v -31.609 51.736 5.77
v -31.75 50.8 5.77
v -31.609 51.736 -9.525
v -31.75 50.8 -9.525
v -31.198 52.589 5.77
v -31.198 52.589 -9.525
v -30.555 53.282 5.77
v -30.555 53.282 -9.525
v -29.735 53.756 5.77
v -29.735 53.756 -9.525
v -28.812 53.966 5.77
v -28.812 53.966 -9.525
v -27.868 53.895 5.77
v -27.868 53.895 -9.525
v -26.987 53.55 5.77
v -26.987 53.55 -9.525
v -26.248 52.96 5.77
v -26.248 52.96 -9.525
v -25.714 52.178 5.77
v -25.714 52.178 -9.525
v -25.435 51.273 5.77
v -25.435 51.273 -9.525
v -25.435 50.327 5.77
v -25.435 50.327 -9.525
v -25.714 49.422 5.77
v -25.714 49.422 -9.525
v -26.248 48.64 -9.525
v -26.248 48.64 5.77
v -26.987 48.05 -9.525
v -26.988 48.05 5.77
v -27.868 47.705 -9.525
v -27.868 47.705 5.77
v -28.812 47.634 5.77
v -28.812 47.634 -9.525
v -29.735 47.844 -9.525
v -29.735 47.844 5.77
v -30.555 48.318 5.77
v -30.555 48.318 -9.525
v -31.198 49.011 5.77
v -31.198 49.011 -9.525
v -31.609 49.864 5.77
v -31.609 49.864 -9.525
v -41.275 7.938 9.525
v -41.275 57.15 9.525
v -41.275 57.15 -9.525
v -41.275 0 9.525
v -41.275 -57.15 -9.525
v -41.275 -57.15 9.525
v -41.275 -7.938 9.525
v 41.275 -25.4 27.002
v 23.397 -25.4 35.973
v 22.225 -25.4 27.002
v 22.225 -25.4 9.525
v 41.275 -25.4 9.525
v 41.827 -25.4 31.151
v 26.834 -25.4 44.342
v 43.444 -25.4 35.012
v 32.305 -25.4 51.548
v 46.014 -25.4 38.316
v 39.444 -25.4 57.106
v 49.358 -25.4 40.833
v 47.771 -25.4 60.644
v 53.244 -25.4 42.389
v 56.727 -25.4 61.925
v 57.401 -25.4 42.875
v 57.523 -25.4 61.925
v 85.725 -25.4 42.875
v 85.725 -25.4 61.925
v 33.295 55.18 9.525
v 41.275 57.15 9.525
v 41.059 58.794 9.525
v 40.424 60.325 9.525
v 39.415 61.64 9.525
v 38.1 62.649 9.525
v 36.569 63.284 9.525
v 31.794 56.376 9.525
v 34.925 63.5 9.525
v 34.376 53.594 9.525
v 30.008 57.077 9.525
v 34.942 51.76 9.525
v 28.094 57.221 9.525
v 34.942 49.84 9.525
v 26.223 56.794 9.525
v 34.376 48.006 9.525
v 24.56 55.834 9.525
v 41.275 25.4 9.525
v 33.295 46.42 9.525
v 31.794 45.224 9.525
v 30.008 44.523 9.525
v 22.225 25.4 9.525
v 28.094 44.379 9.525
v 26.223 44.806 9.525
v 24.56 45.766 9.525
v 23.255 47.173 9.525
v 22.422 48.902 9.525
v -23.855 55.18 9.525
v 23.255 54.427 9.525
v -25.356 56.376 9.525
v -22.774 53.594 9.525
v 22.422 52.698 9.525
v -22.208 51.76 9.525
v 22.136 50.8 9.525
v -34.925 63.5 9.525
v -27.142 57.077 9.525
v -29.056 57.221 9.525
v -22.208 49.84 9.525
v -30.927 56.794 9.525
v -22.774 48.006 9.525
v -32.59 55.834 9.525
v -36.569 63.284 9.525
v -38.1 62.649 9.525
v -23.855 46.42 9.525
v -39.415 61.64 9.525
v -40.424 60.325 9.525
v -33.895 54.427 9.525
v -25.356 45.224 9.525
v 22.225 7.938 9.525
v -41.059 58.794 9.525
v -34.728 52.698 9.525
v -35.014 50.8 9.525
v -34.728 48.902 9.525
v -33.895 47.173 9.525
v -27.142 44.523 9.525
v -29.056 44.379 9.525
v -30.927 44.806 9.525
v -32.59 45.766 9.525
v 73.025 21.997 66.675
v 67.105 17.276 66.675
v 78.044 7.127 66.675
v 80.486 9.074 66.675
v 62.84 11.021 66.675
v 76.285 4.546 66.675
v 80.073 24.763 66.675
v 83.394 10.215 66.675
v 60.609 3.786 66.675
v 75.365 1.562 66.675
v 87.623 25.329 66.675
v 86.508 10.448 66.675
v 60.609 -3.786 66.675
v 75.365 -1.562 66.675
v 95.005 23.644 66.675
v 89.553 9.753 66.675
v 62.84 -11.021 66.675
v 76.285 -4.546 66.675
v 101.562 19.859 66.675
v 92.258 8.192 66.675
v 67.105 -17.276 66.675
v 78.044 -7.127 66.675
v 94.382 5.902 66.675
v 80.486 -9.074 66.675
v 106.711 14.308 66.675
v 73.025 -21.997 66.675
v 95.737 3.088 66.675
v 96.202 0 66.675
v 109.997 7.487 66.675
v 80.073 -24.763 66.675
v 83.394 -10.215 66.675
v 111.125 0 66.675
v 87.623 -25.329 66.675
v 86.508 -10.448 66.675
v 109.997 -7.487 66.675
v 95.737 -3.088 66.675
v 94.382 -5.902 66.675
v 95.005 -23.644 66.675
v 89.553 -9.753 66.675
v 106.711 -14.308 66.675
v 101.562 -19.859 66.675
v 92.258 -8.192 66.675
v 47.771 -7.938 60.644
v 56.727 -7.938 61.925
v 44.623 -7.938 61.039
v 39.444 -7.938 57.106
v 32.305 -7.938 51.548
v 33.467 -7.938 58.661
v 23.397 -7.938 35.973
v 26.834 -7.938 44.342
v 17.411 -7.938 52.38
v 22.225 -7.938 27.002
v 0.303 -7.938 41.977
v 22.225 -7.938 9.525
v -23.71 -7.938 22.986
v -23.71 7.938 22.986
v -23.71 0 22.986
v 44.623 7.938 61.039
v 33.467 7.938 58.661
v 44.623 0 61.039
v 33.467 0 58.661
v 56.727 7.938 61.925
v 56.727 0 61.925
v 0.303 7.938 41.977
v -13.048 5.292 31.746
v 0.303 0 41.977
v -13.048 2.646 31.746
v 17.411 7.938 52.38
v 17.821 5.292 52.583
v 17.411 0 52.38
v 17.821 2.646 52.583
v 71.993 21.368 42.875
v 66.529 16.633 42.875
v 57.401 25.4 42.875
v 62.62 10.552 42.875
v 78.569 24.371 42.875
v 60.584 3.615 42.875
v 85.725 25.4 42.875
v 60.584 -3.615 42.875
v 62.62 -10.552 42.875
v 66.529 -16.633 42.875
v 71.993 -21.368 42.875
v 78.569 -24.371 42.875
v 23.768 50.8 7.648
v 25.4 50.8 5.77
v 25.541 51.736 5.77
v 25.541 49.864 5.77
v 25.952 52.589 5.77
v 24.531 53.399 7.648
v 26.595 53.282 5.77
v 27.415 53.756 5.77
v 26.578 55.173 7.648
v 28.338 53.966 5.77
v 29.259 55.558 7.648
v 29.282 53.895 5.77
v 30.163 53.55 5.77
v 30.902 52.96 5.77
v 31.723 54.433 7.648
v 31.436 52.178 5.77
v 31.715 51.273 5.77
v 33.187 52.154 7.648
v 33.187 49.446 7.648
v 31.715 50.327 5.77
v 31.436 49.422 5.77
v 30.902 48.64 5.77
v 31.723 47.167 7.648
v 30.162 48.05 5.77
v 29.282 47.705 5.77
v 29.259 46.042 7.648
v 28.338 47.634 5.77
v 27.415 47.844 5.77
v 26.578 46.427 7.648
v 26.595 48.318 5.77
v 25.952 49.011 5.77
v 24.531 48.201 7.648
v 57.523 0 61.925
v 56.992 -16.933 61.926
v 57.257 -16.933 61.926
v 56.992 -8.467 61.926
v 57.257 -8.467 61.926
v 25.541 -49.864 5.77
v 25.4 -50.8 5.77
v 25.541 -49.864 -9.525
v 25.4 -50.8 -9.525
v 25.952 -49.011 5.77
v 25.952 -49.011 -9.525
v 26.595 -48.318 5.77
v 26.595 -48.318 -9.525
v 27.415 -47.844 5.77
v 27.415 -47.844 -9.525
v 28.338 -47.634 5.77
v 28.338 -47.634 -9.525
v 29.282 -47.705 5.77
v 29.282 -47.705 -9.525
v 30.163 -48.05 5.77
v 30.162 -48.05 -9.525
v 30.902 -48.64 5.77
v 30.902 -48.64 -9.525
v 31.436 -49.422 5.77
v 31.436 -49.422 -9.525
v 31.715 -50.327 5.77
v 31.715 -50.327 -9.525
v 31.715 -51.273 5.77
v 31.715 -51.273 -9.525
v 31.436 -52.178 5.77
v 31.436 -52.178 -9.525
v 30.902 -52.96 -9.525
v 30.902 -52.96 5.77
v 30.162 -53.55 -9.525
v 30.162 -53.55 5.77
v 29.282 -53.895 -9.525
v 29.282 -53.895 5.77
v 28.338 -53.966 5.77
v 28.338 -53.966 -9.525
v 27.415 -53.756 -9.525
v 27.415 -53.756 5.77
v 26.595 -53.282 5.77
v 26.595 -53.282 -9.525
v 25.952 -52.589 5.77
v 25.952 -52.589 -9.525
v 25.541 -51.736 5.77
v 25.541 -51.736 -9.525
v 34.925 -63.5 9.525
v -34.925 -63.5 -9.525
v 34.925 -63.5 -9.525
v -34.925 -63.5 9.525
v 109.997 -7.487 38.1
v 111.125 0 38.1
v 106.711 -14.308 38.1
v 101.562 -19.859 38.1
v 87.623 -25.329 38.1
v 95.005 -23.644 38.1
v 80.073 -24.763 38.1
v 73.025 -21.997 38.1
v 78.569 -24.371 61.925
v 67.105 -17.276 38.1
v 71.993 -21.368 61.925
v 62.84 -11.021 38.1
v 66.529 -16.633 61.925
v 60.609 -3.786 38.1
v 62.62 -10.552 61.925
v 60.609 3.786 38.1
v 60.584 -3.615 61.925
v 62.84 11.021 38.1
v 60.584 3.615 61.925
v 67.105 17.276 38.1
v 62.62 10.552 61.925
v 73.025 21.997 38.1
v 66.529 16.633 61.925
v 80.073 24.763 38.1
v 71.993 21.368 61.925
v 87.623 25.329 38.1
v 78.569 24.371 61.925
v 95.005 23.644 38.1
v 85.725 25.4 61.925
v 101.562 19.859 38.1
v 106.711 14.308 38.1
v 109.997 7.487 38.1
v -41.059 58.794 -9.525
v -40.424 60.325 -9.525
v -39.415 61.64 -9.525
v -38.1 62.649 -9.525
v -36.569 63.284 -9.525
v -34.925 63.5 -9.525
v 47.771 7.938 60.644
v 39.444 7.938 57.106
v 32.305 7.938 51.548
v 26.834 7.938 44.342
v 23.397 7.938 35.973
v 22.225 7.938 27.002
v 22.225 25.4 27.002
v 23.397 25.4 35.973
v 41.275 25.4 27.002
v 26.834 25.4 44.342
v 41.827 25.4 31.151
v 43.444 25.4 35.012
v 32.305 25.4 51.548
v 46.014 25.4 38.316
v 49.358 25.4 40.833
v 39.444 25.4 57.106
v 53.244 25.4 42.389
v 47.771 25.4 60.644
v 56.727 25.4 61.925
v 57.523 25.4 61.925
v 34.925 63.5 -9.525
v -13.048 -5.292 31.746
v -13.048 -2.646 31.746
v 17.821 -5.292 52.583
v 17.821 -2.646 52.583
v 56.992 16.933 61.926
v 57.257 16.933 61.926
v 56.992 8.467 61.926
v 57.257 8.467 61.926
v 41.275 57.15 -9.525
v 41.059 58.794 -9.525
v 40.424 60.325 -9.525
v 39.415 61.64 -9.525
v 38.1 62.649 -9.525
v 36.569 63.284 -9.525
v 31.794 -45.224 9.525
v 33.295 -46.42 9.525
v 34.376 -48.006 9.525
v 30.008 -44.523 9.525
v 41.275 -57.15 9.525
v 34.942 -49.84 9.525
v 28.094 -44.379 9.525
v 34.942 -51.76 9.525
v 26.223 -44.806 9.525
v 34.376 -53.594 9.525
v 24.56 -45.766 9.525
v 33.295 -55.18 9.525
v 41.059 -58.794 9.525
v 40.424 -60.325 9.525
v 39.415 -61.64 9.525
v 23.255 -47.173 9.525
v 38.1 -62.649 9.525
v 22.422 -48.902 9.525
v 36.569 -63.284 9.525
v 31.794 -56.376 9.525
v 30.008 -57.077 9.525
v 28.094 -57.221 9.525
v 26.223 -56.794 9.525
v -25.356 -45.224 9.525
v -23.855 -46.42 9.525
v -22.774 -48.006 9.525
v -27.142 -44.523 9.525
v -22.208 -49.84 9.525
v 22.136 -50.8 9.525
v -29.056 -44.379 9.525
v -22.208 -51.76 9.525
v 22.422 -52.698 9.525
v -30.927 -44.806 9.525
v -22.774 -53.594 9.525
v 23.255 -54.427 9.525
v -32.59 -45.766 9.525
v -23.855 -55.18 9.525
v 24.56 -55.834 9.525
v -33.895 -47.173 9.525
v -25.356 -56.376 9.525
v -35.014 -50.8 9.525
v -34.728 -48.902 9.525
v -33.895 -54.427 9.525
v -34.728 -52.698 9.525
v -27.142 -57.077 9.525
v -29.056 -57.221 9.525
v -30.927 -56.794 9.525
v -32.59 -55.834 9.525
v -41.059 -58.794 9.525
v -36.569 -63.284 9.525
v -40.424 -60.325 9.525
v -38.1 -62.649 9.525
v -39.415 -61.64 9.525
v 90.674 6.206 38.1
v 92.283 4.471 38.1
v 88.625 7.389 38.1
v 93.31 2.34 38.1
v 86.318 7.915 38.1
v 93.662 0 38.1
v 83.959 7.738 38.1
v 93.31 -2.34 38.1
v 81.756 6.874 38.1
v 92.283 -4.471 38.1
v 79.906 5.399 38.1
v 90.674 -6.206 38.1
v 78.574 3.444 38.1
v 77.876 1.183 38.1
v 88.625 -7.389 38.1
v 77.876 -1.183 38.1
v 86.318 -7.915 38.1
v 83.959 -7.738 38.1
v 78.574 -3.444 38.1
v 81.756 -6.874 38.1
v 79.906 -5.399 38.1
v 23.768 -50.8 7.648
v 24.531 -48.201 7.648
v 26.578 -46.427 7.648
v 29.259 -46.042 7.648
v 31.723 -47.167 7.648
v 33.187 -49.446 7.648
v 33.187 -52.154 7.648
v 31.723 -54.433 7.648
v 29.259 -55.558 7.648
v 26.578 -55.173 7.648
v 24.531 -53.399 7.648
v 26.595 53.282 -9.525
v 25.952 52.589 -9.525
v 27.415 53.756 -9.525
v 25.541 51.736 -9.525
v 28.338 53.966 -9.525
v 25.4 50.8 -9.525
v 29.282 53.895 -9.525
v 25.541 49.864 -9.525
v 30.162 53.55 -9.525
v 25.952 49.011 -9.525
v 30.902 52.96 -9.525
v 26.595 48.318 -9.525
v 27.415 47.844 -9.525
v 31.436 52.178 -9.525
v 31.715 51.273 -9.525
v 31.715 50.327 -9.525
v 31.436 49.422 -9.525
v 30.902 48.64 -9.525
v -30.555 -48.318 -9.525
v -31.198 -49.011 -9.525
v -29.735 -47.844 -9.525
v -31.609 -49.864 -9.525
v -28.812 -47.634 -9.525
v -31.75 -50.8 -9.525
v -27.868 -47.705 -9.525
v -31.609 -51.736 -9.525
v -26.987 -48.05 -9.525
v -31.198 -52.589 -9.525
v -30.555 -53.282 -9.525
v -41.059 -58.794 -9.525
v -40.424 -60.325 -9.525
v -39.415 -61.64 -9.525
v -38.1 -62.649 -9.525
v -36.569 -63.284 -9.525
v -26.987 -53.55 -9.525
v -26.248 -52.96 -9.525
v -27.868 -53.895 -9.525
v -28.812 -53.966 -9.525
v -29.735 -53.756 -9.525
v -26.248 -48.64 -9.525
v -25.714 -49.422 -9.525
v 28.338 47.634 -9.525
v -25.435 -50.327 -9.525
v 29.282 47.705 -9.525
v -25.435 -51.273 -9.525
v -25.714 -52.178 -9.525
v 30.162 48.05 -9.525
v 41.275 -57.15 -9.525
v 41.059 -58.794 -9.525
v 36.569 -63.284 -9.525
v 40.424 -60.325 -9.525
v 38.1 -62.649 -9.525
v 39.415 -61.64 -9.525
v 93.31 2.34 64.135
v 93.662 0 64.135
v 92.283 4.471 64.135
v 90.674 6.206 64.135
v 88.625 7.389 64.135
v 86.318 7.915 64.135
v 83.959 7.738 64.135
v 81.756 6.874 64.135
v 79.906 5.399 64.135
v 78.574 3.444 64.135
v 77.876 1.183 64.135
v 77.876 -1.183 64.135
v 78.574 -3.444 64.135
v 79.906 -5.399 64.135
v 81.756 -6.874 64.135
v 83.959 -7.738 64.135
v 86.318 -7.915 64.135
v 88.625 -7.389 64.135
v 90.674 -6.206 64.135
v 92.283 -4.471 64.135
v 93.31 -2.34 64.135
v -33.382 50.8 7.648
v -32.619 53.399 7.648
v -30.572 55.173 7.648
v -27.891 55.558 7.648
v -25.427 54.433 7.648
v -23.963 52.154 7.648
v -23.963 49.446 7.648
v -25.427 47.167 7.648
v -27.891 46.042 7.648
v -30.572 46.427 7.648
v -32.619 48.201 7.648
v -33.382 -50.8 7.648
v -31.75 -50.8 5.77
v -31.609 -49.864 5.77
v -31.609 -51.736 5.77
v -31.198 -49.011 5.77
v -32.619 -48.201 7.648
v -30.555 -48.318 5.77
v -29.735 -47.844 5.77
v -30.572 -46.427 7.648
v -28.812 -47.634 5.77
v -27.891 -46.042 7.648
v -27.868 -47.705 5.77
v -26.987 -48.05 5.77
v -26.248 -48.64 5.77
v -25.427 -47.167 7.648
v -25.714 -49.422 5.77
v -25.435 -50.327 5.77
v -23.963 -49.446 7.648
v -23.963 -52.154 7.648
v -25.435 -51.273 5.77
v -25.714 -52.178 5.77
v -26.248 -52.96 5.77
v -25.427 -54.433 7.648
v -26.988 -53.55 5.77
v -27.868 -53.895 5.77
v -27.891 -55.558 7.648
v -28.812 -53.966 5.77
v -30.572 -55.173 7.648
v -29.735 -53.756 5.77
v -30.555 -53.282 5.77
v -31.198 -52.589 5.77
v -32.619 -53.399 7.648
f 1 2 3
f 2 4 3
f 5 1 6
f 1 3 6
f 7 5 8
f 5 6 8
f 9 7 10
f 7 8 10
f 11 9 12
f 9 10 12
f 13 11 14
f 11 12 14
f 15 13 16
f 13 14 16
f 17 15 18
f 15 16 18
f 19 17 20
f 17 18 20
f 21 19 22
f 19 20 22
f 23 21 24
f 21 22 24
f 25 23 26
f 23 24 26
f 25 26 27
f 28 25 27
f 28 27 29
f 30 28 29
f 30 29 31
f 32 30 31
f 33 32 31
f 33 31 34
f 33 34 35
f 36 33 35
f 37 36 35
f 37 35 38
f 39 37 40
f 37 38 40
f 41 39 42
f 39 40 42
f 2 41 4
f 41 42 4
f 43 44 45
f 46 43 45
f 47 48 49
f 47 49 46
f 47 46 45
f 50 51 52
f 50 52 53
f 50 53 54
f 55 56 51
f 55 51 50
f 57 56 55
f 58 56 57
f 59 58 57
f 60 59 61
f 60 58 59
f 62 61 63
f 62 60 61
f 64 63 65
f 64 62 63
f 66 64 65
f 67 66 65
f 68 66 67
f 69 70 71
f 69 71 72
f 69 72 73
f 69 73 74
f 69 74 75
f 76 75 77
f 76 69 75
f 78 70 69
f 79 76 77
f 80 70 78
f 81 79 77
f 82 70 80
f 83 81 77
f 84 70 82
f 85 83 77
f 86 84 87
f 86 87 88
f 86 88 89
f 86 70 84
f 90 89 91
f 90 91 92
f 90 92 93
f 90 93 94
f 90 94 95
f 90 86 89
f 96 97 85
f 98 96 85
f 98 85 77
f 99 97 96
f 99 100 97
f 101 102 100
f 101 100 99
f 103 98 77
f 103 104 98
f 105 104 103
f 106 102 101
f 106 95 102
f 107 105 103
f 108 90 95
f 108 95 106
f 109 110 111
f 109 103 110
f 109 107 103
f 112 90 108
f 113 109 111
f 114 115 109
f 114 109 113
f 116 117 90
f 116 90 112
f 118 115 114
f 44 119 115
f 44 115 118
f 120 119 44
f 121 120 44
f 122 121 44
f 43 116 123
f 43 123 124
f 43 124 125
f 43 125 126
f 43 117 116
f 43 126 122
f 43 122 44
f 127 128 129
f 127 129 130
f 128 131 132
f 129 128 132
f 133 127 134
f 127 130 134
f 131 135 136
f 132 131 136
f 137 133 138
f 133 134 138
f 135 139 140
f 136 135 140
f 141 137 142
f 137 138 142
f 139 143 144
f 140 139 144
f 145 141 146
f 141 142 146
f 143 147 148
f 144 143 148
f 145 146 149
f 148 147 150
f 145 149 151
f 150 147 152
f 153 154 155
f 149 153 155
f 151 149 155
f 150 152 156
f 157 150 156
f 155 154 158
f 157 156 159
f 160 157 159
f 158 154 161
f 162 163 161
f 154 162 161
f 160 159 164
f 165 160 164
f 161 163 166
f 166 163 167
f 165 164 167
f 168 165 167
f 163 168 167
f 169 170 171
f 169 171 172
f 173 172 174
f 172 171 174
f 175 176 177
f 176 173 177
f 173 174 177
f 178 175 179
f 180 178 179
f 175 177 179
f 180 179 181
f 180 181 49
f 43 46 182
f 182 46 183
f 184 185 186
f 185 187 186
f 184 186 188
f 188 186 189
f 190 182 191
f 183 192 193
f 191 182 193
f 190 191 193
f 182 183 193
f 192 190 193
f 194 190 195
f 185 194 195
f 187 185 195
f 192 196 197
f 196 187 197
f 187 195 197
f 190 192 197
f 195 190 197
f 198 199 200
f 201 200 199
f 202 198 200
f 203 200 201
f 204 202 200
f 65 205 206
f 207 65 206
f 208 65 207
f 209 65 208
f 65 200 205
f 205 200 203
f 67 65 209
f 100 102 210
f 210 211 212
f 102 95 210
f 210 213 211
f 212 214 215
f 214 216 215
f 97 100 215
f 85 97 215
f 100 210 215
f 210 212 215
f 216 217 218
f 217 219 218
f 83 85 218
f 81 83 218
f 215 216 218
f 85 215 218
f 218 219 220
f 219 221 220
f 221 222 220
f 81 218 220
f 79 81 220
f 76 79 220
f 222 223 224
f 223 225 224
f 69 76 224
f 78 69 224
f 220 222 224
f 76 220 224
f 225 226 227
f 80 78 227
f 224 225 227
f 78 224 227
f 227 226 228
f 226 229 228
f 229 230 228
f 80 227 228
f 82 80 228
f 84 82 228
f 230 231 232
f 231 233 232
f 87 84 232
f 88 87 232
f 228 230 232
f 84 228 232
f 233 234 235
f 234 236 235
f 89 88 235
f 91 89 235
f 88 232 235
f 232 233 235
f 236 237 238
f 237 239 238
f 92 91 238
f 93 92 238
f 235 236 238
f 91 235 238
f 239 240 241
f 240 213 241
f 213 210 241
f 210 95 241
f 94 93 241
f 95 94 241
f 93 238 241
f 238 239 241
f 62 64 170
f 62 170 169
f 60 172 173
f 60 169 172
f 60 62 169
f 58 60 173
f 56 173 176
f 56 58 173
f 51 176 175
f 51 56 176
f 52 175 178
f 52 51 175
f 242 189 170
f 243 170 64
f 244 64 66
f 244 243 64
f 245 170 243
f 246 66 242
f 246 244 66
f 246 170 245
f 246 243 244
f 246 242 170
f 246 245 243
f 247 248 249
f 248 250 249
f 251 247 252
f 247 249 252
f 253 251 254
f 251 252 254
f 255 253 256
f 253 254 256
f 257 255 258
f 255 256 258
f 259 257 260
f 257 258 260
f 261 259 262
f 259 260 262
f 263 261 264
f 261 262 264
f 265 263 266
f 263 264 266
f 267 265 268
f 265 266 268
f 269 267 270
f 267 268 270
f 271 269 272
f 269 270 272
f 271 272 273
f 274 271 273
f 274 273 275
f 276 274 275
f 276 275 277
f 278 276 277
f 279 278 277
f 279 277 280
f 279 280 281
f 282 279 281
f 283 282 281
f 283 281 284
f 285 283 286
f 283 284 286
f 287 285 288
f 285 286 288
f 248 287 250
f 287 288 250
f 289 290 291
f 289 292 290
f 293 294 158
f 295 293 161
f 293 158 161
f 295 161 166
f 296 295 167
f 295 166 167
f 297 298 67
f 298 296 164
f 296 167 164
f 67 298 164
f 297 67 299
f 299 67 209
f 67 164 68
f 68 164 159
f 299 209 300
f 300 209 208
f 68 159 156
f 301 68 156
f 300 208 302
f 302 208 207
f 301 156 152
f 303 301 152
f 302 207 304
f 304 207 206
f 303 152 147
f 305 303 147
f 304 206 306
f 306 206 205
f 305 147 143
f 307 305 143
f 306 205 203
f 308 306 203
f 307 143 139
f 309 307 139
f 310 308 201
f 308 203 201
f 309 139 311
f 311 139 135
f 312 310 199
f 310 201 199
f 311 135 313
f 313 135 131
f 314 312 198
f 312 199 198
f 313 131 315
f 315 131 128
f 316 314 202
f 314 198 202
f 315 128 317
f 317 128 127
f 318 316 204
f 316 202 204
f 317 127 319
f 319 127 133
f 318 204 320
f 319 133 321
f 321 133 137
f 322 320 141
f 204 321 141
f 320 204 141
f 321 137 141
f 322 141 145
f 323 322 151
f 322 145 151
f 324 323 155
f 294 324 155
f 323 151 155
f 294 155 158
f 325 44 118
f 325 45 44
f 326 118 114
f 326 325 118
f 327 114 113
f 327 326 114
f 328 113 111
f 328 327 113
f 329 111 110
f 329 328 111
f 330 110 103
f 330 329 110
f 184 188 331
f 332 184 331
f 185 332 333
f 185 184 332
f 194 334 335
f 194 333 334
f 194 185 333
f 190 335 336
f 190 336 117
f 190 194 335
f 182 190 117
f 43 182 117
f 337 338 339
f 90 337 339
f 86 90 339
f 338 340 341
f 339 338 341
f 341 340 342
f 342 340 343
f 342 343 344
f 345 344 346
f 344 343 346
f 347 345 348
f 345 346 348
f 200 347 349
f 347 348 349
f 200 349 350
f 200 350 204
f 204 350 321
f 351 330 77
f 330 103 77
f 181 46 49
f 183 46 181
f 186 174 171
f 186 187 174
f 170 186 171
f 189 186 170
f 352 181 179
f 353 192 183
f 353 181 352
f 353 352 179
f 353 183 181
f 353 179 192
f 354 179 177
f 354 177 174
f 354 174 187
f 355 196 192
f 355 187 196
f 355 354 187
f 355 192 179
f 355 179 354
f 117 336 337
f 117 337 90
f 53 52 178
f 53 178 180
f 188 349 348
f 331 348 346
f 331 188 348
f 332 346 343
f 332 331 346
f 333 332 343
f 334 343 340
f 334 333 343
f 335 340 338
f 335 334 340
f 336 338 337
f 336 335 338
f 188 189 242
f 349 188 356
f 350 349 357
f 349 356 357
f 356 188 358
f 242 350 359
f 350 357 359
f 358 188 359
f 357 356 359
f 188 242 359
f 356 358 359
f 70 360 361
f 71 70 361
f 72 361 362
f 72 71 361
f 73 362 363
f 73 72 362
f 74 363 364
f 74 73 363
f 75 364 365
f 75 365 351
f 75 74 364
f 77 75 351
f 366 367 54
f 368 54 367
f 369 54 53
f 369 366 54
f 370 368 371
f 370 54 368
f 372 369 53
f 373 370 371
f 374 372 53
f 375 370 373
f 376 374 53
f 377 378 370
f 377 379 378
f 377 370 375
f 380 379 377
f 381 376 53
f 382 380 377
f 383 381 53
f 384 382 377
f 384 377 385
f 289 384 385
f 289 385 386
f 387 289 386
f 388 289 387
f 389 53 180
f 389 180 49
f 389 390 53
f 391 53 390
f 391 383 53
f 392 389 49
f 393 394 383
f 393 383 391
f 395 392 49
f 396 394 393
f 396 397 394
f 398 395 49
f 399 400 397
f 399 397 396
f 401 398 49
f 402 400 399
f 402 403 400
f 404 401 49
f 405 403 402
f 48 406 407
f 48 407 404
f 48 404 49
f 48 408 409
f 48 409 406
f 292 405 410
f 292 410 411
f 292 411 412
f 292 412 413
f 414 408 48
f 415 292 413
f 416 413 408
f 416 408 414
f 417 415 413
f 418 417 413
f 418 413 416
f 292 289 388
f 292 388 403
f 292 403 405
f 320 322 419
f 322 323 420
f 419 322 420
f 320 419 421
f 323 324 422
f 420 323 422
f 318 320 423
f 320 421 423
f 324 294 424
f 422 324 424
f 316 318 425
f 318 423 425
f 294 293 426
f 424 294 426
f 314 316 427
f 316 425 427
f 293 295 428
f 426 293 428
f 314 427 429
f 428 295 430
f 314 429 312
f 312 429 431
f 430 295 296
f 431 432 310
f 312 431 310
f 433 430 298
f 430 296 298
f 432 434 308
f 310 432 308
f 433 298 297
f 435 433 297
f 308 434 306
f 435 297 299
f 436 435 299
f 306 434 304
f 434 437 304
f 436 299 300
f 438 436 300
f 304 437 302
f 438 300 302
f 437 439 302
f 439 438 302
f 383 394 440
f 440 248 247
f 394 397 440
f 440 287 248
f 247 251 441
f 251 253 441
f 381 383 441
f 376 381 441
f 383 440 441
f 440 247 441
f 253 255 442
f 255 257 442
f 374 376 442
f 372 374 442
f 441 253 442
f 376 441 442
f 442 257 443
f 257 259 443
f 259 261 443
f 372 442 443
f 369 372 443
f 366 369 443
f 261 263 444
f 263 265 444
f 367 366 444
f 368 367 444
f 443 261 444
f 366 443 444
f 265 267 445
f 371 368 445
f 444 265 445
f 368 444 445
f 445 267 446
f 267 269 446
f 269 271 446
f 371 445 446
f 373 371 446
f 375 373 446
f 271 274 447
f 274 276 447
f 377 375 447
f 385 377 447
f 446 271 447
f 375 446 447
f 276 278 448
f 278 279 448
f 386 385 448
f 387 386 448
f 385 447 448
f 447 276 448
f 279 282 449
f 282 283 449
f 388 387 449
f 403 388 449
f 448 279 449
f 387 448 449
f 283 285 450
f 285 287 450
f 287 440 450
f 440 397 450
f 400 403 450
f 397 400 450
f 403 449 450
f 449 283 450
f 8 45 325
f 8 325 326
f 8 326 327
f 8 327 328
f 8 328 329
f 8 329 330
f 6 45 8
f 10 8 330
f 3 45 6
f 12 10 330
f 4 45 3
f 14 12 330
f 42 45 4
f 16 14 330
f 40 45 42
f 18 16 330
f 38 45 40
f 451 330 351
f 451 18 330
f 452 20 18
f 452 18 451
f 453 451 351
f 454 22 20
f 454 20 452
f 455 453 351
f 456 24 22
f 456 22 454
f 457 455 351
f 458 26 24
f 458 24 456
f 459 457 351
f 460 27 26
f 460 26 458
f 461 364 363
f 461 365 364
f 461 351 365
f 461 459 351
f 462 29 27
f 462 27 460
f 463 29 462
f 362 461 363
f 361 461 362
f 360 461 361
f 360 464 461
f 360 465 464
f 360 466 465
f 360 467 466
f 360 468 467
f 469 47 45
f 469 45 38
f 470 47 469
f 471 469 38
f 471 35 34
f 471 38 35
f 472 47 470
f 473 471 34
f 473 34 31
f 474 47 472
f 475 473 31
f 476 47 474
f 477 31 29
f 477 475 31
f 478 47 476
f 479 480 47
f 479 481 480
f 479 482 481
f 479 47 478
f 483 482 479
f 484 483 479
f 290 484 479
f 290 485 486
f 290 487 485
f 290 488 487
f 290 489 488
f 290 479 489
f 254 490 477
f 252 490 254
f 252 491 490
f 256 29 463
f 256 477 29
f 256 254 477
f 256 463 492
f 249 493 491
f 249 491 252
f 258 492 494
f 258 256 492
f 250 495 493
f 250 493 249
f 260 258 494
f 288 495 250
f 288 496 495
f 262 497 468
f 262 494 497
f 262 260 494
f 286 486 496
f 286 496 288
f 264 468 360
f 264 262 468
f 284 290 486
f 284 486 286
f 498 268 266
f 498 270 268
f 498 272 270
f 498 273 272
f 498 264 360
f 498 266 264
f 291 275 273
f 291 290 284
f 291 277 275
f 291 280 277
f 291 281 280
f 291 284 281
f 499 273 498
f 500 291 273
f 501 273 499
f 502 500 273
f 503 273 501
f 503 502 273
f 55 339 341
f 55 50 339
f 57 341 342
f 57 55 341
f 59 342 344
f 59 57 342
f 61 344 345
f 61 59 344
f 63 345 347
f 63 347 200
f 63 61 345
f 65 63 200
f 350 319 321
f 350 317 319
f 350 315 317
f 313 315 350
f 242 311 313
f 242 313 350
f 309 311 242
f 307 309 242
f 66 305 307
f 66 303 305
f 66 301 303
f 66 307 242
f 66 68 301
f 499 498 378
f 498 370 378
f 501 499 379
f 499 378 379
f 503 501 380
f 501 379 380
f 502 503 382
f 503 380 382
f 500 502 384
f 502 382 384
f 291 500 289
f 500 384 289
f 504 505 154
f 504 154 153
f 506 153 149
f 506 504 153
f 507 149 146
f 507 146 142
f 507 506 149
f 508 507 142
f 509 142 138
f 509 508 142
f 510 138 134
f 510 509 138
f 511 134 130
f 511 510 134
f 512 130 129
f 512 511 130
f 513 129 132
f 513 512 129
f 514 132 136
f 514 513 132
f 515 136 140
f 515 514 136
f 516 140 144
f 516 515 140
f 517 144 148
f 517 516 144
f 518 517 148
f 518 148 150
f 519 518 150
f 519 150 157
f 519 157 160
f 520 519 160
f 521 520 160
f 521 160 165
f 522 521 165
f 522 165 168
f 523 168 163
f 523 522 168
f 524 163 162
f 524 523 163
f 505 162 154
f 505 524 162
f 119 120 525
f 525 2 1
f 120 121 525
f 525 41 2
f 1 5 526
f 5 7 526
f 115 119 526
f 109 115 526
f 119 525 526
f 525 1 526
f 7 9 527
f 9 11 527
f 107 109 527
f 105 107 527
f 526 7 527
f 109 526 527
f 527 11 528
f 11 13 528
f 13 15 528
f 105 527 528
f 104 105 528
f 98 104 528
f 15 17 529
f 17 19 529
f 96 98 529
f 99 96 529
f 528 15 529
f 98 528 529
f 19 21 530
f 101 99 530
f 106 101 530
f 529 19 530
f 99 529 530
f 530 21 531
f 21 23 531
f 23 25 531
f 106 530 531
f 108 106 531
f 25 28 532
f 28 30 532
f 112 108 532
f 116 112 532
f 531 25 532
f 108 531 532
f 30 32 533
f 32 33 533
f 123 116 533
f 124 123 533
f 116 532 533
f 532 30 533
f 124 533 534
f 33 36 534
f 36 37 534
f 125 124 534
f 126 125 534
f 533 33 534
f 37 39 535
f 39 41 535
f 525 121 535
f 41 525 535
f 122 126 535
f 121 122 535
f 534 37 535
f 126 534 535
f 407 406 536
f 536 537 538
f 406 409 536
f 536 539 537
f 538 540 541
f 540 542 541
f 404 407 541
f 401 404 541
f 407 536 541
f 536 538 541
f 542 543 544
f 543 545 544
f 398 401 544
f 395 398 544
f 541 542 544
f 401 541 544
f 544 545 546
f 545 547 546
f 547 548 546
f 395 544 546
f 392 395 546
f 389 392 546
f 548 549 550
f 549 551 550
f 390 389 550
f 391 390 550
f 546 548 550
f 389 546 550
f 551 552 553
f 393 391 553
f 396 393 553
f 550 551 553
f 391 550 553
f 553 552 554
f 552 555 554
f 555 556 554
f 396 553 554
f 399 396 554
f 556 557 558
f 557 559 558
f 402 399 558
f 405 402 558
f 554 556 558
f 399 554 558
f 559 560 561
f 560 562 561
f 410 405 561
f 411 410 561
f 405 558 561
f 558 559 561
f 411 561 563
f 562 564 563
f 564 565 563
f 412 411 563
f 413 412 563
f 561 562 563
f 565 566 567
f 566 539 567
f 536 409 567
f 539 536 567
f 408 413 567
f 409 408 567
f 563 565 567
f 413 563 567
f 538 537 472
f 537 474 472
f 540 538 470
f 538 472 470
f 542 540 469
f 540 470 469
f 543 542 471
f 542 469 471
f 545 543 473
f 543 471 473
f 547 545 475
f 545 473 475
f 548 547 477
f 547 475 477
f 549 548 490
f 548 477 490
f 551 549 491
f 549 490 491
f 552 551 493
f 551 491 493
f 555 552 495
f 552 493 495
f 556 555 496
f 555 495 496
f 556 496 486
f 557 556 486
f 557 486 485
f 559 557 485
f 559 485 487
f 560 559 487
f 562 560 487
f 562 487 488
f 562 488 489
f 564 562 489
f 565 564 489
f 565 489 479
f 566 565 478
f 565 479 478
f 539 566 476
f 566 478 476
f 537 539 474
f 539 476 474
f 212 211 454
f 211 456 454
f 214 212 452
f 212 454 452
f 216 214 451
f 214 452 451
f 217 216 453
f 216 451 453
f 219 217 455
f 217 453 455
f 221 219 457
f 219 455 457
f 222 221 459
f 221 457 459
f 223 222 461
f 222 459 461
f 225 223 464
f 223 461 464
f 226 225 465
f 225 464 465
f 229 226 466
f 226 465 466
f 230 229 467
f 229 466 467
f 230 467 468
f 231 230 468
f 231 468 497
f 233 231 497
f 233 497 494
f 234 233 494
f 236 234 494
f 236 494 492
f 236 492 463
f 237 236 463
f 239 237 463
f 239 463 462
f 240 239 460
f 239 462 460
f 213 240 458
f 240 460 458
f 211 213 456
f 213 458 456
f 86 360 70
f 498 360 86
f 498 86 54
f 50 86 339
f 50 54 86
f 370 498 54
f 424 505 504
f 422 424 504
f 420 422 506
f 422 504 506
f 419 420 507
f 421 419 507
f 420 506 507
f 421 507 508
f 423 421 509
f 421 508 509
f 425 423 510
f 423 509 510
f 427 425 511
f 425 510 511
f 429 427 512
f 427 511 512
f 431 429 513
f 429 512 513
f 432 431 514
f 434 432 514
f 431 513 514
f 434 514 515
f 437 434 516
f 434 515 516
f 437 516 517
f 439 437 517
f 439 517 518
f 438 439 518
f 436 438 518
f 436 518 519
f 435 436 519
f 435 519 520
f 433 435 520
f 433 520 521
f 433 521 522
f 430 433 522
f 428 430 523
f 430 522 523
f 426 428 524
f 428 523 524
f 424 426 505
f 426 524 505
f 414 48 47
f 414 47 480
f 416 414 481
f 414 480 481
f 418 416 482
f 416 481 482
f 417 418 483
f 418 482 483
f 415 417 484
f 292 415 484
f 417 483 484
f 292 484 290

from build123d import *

# Parameters (mm, degrees)
F1_DEPTH        = 63.5
F0_W            = 25.4
F0_H            = 19.05
F2_DEPTH        = 25.4
F3_DEPTH        = 7.9375
F5_R            = 6.35
F6_R            = 7.9375
F7_DEPTH        = 38.1
F8_SIZE         = 2.54
F10_D           = 6.35
F10_CSINK_D     = 12.8778
F10_CSINK_ANGLE = 82


with BuildPart() as f1:
    # F0 (on Front) → F1 (new body, symmetric)
    with BuildSketch(Plane.XZ):
        Polygon((-41.275, -9.525), (41.275, -9.525), (41.275, 9.525), (22.225, 9.525), (-41.275, 9.525), align=None)
    extrude(amount=F1_DEPTH, both=True)

    # F0 (on Front) → F2 (join, symmetric)
    with BuildSketch(Plane.XZ):
        with Locations((73.025, 52.4002)):
            Rectangle(F0_W, F0_H)
        with BuildLine():
            Line((22.225, 9.525), (41.275, 9.525))
            Line((41.275, 9.525), (41.275, 27.0021876939))
            ThreePointArc((41.275, 27.0021876939), (46.0138493613, 38.3159745909), (57.401207742, 42.8752))
            Line((57.401207742, 42.8752), (60.325, 42.8752))
            Line((60.325, 42.8752), (60.325, 61.9252))
            Line((60.325, 61.9252), (57.5226076573, 61.9252))
            add(Edge.make_bspline(
                [(56.7269681039, 61.9246255958), (56.9914748423, 61.9259537401), (57.2566863526, 61.9261483453), (57.5226076573, 61.9252)],
                knots=[111.1760466233, 111.1760466233, 111.1760466233, 111.1760466233, 111.8335738446, 111.8335738446, 111.8335738446, 111.8335738446], degree=3))
            ThreePointArc((56.7269681039, 61.9246255958), (32.3051814862, 51.5478719991), (22.225, 27.0021876939))
            Line((22.225, 27.0021876939), (22.225, 9.525))
        make_face()
    extrude(amount=F2_DEPTH, both=True)

    # F0 (on Front) → F3 (join, symmetric)
    with BuildSketch(Plane.XZ):
        with BuildLine():
            add(Edge.make_bspline(
                [(-41.275, 9.525), (-12.5711712421, 29.0690447456), (12.0036281031, 61.7000602517), (56.7269681039, 61.9246255958)],
                knots=[0, 0, 0, 0, 111.1760466233, 111.1760466233, 111.1760466233, 111.1760466233], degree=3))
            Line((-41.275, 9.525), (22.225, 9.525))
            Line((22.225, 9.525), (22.225, 27.0021876939))
            ThreePointArc((22.225, 27.0021876939), (32.3051814862, 51.5478719991), (56.7269681039, 61.9246255958))
        make_face()
    extrude(amount=F3_DEPTH, both=True)

    # F0 (on Front) → F4 (revolve)
    with BuildSketch(Plane.XZ):
        Polygon((85.725, 61.9252), (85.725, 42.8752), (85.725, 38.1), (111.125, 38.1), (111.125, 66.675), (85.725, 66.675), align=None)
    revolve(axis=Axis((85.725, 0, 52.3875), (0, 0, -1)))

    # F5
    f5_edges = [f1.edges().sort_by_distance(p)[0] for p in [
        (41.275, -63.5, 0),
        (-41.275, -63.5, 0),
        (-41.275, 63.5, 0),
        (41.275, 63.5, 0),
    ]]
    fillet(f5_edges, radius=F5_R)

    # F6 (on face) → F7 (cut, symmetric)
    with BuildSketch(Plane.XY.offset(66.675)):
        with Locations((85.725, 0)):
            Circle(F6_R)
    extrude(amount=F7_DEPTH, both=True, mode=Mode.SUBTRACT)

    # F8
    f8_edges = [f1.edges().sort_by_distance(p)[0] for p in [
        (77.7875, 0, 66.675),
    ]]
    chamfer(f8_edges, length=F8_SIZE)

    # F10 (through all)
    with Locations(Plane.XY.offset(9.525)):
        with Locations((-28.575, 50.8), (28.575, 50.8), (28.575, -50.8), (-28.575, -50.8)):
            CounterSinkHole(F10_D / 2, F10_CSINK_D / 2, counter_sink_angle=F10_CSINK_ANGLE)


solid = f1.part
